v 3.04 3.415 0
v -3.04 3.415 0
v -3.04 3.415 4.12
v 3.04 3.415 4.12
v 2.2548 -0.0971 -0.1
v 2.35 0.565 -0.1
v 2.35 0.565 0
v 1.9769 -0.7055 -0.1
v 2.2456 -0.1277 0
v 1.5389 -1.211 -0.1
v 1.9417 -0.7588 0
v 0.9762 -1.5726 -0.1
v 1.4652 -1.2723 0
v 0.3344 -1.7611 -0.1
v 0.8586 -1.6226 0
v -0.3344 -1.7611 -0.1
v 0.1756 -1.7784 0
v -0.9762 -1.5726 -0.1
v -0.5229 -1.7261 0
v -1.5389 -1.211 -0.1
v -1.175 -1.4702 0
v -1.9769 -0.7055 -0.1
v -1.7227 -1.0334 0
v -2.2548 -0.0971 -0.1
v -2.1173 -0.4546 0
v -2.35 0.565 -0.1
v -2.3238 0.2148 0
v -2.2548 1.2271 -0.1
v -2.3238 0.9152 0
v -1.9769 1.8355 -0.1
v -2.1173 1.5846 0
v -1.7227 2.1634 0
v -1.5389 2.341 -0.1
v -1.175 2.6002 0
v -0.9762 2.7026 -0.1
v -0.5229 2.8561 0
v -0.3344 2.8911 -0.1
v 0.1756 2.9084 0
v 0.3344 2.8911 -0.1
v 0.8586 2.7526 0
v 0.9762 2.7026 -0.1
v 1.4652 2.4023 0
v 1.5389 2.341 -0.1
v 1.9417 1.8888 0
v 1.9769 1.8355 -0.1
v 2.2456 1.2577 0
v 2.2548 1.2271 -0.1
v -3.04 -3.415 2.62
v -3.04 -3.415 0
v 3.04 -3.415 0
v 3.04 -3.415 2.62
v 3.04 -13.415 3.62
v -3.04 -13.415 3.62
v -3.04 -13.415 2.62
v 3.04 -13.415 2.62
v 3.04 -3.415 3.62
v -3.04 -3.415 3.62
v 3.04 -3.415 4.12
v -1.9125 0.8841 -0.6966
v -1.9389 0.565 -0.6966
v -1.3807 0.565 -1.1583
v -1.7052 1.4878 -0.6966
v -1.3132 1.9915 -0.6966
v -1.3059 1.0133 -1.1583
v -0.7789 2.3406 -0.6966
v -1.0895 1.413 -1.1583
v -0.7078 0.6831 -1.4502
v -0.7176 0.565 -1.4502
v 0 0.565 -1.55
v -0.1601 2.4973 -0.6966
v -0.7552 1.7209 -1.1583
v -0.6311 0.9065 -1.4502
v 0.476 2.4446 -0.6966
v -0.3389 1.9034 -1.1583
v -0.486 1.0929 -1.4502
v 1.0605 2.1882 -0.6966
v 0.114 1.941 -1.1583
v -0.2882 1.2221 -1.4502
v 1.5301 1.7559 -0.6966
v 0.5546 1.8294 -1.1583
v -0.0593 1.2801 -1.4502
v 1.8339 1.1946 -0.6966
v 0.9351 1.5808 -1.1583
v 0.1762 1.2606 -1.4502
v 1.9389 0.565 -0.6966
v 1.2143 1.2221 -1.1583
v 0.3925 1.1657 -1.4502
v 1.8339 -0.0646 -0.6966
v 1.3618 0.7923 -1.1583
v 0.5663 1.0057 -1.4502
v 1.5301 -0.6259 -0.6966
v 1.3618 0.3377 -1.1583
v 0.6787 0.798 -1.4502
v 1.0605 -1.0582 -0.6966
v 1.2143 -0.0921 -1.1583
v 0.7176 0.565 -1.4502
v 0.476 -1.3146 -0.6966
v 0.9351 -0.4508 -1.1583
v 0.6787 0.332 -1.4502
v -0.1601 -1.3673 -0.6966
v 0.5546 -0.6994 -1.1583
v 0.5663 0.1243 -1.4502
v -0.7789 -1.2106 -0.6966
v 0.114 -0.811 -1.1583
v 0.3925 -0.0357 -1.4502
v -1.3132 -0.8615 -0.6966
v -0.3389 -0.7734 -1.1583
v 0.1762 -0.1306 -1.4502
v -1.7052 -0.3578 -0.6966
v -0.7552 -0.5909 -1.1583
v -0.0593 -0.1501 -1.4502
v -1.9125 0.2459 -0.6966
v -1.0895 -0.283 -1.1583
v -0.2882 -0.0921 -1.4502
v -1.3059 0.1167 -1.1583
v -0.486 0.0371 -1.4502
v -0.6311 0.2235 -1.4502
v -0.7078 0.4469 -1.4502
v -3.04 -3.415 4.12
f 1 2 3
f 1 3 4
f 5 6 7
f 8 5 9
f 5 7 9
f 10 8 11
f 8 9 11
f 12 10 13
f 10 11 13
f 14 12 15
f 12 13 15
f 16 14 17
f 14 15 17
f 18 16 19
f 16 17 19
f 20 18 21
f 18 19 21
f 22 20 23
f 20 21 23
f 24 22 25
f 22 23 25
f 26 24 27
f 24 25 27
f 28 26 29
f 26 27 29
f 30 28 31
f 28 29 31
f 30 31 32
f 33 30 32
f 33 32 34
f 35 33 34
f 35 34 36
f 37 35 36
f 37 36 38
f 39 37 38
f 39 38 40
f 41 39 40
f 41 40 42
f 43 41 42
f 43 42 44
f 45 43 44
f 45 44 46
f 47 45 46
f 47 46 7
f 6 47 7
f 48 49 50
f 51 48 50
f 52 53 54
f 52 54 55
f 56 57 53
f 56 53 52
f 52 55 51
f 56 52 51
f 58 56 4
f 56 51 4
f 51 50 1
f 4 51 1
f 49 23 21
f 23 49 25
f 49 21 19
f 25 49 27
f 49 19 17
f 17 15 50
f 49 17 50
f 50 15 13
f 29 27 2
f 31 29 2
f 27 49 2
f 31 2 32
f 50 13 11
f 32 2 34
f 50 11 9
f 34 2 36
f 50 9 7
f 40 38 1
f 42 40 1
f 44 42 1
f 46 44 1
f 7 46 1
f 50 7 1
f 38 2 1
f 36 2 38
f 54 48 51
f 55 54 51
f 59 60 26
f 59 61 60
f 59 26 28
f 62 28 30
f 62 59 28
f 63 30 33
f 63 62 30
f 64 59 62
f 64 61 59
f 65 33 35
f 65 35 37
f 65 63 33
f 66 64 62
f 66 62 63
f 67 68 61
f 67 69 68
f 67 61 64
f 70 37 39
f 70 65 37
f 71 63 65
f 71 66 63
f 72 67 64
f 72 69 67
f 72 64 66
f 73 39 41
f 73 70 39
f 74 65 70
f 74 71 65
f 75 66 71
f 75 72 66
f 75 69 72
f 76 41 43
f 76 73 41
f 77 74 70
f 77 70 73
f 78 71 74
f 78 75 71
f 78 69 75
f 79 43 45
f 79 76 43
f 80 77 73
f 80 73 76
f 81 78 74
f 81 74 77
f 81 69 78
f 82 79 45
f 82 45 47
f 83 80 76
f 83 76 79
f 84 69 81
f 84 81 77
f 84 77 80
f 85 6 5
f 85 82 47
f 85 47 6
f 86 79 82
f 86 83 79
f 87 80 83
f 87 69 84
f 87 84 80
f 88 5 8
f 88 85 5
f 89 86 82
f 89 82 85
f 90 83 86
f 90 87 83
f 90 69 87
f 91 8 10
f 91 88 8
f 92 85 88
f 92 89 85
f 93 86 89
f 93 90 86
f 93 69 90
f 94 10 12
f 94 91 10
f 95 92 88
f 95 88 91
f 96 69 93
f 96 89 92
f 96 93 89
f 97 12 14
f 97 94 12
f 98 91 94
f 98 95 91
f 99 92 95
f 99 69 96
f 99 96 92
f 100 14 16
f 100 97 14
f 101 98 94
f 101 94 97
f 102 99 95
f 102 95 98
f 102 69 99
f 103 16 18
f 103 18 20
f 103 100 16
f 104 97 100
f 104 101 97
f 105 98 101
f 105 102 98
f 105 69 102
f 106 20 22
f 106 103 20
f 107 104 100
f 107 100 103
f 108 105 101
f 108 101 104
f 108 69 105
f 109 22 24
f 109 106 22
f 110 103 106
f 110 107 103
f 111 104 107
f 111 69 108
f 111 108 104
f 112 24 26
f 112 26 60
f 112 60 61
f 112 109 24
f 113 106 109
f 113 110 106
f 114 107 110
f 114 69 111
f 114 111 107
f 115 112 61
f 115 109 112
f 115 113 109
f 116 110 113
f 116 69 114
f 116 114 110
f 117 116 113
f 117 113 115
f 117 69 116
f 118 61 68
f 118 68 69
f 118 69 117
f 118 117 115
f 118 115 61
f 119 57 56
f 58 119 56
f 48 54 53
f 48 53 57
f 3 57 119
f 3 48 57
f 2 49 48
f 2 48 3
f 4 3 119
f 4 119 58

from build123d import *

# Parameters (mm, degrees)
SKETCH_1_W         = 6.08
SKETCH_1_H         = 6.83
EXTRUDE_1_DEPTH    = 4.12
SKETCH_2_R         = 2.35
EXTRUDE_2_DEPTH    = 0.1
DOME_1_FACE_RADIUS = 2.35
DOME_1_HEIGHT      = 1.45
SKETCH_4_W         = 6.08
SKETCH_4_H         = 1
EXTRUDE_1_2_DEPTH  = 10


with BuildPart() as part:
    # 草图1 → Extrude 1 (new body)
    with BuildSketch(Plane.XY):
        Rectangle(SKETCH_1_W, SKETCH_1_H)
    extrude(amount=EXTRUDE_1_DEPTH)

    # 草图2 → 拉伸2 (add)
    with BuildSketch(Plane(origin=(0, 0, 0), x_dir=(-1, 0, 0), z_dir=(0, 0, -1))):
        with Locations(Location((0, 0.565, 0), (0, 0, 180))):
            Circle(SKETCH_2_R)
    extrude(amount=EXTRUDE_2_DEPTH)

    # 圆顶1: a dome of height H over a round flat face of radius A is a cap of a sphere of radius (A * A + H * H) / (2 * H)
    dome_1_r = (DOME_1_FACE_RADIUS * DOME_1_FACE_RADIUS + DOME_1_HEIGHT * DOME_1_HEIGHT) / (2 * DOME_1_HEIGHT)
    dome_1_base = Plane((0, 0.565, -0.1), z_dir=(0, 0, -1))
    with Locations(dome_1_base.offset(DOME_1_HEIGHT - dome_1_r)):
        dome_1_ball = Sphere(dome_1_r, mode=Mode.PRIVATE)
    add(split(dome_1_ball, bisect_by=dome_1_base, keep=Keep.TOP, mode=Mode.PRIVATE))

    # 草图4 → Extrude 1 2 (add)
    with BuildSketch(Plane.XZ.offset(3.415)):
        with Locations((0, 3.12)):
            Rectangle(SKETCH_4_W, SKETCH_4_H)
    extrude(amount=EXTRUDE_1_2_DEPTH)


solid = part.part
